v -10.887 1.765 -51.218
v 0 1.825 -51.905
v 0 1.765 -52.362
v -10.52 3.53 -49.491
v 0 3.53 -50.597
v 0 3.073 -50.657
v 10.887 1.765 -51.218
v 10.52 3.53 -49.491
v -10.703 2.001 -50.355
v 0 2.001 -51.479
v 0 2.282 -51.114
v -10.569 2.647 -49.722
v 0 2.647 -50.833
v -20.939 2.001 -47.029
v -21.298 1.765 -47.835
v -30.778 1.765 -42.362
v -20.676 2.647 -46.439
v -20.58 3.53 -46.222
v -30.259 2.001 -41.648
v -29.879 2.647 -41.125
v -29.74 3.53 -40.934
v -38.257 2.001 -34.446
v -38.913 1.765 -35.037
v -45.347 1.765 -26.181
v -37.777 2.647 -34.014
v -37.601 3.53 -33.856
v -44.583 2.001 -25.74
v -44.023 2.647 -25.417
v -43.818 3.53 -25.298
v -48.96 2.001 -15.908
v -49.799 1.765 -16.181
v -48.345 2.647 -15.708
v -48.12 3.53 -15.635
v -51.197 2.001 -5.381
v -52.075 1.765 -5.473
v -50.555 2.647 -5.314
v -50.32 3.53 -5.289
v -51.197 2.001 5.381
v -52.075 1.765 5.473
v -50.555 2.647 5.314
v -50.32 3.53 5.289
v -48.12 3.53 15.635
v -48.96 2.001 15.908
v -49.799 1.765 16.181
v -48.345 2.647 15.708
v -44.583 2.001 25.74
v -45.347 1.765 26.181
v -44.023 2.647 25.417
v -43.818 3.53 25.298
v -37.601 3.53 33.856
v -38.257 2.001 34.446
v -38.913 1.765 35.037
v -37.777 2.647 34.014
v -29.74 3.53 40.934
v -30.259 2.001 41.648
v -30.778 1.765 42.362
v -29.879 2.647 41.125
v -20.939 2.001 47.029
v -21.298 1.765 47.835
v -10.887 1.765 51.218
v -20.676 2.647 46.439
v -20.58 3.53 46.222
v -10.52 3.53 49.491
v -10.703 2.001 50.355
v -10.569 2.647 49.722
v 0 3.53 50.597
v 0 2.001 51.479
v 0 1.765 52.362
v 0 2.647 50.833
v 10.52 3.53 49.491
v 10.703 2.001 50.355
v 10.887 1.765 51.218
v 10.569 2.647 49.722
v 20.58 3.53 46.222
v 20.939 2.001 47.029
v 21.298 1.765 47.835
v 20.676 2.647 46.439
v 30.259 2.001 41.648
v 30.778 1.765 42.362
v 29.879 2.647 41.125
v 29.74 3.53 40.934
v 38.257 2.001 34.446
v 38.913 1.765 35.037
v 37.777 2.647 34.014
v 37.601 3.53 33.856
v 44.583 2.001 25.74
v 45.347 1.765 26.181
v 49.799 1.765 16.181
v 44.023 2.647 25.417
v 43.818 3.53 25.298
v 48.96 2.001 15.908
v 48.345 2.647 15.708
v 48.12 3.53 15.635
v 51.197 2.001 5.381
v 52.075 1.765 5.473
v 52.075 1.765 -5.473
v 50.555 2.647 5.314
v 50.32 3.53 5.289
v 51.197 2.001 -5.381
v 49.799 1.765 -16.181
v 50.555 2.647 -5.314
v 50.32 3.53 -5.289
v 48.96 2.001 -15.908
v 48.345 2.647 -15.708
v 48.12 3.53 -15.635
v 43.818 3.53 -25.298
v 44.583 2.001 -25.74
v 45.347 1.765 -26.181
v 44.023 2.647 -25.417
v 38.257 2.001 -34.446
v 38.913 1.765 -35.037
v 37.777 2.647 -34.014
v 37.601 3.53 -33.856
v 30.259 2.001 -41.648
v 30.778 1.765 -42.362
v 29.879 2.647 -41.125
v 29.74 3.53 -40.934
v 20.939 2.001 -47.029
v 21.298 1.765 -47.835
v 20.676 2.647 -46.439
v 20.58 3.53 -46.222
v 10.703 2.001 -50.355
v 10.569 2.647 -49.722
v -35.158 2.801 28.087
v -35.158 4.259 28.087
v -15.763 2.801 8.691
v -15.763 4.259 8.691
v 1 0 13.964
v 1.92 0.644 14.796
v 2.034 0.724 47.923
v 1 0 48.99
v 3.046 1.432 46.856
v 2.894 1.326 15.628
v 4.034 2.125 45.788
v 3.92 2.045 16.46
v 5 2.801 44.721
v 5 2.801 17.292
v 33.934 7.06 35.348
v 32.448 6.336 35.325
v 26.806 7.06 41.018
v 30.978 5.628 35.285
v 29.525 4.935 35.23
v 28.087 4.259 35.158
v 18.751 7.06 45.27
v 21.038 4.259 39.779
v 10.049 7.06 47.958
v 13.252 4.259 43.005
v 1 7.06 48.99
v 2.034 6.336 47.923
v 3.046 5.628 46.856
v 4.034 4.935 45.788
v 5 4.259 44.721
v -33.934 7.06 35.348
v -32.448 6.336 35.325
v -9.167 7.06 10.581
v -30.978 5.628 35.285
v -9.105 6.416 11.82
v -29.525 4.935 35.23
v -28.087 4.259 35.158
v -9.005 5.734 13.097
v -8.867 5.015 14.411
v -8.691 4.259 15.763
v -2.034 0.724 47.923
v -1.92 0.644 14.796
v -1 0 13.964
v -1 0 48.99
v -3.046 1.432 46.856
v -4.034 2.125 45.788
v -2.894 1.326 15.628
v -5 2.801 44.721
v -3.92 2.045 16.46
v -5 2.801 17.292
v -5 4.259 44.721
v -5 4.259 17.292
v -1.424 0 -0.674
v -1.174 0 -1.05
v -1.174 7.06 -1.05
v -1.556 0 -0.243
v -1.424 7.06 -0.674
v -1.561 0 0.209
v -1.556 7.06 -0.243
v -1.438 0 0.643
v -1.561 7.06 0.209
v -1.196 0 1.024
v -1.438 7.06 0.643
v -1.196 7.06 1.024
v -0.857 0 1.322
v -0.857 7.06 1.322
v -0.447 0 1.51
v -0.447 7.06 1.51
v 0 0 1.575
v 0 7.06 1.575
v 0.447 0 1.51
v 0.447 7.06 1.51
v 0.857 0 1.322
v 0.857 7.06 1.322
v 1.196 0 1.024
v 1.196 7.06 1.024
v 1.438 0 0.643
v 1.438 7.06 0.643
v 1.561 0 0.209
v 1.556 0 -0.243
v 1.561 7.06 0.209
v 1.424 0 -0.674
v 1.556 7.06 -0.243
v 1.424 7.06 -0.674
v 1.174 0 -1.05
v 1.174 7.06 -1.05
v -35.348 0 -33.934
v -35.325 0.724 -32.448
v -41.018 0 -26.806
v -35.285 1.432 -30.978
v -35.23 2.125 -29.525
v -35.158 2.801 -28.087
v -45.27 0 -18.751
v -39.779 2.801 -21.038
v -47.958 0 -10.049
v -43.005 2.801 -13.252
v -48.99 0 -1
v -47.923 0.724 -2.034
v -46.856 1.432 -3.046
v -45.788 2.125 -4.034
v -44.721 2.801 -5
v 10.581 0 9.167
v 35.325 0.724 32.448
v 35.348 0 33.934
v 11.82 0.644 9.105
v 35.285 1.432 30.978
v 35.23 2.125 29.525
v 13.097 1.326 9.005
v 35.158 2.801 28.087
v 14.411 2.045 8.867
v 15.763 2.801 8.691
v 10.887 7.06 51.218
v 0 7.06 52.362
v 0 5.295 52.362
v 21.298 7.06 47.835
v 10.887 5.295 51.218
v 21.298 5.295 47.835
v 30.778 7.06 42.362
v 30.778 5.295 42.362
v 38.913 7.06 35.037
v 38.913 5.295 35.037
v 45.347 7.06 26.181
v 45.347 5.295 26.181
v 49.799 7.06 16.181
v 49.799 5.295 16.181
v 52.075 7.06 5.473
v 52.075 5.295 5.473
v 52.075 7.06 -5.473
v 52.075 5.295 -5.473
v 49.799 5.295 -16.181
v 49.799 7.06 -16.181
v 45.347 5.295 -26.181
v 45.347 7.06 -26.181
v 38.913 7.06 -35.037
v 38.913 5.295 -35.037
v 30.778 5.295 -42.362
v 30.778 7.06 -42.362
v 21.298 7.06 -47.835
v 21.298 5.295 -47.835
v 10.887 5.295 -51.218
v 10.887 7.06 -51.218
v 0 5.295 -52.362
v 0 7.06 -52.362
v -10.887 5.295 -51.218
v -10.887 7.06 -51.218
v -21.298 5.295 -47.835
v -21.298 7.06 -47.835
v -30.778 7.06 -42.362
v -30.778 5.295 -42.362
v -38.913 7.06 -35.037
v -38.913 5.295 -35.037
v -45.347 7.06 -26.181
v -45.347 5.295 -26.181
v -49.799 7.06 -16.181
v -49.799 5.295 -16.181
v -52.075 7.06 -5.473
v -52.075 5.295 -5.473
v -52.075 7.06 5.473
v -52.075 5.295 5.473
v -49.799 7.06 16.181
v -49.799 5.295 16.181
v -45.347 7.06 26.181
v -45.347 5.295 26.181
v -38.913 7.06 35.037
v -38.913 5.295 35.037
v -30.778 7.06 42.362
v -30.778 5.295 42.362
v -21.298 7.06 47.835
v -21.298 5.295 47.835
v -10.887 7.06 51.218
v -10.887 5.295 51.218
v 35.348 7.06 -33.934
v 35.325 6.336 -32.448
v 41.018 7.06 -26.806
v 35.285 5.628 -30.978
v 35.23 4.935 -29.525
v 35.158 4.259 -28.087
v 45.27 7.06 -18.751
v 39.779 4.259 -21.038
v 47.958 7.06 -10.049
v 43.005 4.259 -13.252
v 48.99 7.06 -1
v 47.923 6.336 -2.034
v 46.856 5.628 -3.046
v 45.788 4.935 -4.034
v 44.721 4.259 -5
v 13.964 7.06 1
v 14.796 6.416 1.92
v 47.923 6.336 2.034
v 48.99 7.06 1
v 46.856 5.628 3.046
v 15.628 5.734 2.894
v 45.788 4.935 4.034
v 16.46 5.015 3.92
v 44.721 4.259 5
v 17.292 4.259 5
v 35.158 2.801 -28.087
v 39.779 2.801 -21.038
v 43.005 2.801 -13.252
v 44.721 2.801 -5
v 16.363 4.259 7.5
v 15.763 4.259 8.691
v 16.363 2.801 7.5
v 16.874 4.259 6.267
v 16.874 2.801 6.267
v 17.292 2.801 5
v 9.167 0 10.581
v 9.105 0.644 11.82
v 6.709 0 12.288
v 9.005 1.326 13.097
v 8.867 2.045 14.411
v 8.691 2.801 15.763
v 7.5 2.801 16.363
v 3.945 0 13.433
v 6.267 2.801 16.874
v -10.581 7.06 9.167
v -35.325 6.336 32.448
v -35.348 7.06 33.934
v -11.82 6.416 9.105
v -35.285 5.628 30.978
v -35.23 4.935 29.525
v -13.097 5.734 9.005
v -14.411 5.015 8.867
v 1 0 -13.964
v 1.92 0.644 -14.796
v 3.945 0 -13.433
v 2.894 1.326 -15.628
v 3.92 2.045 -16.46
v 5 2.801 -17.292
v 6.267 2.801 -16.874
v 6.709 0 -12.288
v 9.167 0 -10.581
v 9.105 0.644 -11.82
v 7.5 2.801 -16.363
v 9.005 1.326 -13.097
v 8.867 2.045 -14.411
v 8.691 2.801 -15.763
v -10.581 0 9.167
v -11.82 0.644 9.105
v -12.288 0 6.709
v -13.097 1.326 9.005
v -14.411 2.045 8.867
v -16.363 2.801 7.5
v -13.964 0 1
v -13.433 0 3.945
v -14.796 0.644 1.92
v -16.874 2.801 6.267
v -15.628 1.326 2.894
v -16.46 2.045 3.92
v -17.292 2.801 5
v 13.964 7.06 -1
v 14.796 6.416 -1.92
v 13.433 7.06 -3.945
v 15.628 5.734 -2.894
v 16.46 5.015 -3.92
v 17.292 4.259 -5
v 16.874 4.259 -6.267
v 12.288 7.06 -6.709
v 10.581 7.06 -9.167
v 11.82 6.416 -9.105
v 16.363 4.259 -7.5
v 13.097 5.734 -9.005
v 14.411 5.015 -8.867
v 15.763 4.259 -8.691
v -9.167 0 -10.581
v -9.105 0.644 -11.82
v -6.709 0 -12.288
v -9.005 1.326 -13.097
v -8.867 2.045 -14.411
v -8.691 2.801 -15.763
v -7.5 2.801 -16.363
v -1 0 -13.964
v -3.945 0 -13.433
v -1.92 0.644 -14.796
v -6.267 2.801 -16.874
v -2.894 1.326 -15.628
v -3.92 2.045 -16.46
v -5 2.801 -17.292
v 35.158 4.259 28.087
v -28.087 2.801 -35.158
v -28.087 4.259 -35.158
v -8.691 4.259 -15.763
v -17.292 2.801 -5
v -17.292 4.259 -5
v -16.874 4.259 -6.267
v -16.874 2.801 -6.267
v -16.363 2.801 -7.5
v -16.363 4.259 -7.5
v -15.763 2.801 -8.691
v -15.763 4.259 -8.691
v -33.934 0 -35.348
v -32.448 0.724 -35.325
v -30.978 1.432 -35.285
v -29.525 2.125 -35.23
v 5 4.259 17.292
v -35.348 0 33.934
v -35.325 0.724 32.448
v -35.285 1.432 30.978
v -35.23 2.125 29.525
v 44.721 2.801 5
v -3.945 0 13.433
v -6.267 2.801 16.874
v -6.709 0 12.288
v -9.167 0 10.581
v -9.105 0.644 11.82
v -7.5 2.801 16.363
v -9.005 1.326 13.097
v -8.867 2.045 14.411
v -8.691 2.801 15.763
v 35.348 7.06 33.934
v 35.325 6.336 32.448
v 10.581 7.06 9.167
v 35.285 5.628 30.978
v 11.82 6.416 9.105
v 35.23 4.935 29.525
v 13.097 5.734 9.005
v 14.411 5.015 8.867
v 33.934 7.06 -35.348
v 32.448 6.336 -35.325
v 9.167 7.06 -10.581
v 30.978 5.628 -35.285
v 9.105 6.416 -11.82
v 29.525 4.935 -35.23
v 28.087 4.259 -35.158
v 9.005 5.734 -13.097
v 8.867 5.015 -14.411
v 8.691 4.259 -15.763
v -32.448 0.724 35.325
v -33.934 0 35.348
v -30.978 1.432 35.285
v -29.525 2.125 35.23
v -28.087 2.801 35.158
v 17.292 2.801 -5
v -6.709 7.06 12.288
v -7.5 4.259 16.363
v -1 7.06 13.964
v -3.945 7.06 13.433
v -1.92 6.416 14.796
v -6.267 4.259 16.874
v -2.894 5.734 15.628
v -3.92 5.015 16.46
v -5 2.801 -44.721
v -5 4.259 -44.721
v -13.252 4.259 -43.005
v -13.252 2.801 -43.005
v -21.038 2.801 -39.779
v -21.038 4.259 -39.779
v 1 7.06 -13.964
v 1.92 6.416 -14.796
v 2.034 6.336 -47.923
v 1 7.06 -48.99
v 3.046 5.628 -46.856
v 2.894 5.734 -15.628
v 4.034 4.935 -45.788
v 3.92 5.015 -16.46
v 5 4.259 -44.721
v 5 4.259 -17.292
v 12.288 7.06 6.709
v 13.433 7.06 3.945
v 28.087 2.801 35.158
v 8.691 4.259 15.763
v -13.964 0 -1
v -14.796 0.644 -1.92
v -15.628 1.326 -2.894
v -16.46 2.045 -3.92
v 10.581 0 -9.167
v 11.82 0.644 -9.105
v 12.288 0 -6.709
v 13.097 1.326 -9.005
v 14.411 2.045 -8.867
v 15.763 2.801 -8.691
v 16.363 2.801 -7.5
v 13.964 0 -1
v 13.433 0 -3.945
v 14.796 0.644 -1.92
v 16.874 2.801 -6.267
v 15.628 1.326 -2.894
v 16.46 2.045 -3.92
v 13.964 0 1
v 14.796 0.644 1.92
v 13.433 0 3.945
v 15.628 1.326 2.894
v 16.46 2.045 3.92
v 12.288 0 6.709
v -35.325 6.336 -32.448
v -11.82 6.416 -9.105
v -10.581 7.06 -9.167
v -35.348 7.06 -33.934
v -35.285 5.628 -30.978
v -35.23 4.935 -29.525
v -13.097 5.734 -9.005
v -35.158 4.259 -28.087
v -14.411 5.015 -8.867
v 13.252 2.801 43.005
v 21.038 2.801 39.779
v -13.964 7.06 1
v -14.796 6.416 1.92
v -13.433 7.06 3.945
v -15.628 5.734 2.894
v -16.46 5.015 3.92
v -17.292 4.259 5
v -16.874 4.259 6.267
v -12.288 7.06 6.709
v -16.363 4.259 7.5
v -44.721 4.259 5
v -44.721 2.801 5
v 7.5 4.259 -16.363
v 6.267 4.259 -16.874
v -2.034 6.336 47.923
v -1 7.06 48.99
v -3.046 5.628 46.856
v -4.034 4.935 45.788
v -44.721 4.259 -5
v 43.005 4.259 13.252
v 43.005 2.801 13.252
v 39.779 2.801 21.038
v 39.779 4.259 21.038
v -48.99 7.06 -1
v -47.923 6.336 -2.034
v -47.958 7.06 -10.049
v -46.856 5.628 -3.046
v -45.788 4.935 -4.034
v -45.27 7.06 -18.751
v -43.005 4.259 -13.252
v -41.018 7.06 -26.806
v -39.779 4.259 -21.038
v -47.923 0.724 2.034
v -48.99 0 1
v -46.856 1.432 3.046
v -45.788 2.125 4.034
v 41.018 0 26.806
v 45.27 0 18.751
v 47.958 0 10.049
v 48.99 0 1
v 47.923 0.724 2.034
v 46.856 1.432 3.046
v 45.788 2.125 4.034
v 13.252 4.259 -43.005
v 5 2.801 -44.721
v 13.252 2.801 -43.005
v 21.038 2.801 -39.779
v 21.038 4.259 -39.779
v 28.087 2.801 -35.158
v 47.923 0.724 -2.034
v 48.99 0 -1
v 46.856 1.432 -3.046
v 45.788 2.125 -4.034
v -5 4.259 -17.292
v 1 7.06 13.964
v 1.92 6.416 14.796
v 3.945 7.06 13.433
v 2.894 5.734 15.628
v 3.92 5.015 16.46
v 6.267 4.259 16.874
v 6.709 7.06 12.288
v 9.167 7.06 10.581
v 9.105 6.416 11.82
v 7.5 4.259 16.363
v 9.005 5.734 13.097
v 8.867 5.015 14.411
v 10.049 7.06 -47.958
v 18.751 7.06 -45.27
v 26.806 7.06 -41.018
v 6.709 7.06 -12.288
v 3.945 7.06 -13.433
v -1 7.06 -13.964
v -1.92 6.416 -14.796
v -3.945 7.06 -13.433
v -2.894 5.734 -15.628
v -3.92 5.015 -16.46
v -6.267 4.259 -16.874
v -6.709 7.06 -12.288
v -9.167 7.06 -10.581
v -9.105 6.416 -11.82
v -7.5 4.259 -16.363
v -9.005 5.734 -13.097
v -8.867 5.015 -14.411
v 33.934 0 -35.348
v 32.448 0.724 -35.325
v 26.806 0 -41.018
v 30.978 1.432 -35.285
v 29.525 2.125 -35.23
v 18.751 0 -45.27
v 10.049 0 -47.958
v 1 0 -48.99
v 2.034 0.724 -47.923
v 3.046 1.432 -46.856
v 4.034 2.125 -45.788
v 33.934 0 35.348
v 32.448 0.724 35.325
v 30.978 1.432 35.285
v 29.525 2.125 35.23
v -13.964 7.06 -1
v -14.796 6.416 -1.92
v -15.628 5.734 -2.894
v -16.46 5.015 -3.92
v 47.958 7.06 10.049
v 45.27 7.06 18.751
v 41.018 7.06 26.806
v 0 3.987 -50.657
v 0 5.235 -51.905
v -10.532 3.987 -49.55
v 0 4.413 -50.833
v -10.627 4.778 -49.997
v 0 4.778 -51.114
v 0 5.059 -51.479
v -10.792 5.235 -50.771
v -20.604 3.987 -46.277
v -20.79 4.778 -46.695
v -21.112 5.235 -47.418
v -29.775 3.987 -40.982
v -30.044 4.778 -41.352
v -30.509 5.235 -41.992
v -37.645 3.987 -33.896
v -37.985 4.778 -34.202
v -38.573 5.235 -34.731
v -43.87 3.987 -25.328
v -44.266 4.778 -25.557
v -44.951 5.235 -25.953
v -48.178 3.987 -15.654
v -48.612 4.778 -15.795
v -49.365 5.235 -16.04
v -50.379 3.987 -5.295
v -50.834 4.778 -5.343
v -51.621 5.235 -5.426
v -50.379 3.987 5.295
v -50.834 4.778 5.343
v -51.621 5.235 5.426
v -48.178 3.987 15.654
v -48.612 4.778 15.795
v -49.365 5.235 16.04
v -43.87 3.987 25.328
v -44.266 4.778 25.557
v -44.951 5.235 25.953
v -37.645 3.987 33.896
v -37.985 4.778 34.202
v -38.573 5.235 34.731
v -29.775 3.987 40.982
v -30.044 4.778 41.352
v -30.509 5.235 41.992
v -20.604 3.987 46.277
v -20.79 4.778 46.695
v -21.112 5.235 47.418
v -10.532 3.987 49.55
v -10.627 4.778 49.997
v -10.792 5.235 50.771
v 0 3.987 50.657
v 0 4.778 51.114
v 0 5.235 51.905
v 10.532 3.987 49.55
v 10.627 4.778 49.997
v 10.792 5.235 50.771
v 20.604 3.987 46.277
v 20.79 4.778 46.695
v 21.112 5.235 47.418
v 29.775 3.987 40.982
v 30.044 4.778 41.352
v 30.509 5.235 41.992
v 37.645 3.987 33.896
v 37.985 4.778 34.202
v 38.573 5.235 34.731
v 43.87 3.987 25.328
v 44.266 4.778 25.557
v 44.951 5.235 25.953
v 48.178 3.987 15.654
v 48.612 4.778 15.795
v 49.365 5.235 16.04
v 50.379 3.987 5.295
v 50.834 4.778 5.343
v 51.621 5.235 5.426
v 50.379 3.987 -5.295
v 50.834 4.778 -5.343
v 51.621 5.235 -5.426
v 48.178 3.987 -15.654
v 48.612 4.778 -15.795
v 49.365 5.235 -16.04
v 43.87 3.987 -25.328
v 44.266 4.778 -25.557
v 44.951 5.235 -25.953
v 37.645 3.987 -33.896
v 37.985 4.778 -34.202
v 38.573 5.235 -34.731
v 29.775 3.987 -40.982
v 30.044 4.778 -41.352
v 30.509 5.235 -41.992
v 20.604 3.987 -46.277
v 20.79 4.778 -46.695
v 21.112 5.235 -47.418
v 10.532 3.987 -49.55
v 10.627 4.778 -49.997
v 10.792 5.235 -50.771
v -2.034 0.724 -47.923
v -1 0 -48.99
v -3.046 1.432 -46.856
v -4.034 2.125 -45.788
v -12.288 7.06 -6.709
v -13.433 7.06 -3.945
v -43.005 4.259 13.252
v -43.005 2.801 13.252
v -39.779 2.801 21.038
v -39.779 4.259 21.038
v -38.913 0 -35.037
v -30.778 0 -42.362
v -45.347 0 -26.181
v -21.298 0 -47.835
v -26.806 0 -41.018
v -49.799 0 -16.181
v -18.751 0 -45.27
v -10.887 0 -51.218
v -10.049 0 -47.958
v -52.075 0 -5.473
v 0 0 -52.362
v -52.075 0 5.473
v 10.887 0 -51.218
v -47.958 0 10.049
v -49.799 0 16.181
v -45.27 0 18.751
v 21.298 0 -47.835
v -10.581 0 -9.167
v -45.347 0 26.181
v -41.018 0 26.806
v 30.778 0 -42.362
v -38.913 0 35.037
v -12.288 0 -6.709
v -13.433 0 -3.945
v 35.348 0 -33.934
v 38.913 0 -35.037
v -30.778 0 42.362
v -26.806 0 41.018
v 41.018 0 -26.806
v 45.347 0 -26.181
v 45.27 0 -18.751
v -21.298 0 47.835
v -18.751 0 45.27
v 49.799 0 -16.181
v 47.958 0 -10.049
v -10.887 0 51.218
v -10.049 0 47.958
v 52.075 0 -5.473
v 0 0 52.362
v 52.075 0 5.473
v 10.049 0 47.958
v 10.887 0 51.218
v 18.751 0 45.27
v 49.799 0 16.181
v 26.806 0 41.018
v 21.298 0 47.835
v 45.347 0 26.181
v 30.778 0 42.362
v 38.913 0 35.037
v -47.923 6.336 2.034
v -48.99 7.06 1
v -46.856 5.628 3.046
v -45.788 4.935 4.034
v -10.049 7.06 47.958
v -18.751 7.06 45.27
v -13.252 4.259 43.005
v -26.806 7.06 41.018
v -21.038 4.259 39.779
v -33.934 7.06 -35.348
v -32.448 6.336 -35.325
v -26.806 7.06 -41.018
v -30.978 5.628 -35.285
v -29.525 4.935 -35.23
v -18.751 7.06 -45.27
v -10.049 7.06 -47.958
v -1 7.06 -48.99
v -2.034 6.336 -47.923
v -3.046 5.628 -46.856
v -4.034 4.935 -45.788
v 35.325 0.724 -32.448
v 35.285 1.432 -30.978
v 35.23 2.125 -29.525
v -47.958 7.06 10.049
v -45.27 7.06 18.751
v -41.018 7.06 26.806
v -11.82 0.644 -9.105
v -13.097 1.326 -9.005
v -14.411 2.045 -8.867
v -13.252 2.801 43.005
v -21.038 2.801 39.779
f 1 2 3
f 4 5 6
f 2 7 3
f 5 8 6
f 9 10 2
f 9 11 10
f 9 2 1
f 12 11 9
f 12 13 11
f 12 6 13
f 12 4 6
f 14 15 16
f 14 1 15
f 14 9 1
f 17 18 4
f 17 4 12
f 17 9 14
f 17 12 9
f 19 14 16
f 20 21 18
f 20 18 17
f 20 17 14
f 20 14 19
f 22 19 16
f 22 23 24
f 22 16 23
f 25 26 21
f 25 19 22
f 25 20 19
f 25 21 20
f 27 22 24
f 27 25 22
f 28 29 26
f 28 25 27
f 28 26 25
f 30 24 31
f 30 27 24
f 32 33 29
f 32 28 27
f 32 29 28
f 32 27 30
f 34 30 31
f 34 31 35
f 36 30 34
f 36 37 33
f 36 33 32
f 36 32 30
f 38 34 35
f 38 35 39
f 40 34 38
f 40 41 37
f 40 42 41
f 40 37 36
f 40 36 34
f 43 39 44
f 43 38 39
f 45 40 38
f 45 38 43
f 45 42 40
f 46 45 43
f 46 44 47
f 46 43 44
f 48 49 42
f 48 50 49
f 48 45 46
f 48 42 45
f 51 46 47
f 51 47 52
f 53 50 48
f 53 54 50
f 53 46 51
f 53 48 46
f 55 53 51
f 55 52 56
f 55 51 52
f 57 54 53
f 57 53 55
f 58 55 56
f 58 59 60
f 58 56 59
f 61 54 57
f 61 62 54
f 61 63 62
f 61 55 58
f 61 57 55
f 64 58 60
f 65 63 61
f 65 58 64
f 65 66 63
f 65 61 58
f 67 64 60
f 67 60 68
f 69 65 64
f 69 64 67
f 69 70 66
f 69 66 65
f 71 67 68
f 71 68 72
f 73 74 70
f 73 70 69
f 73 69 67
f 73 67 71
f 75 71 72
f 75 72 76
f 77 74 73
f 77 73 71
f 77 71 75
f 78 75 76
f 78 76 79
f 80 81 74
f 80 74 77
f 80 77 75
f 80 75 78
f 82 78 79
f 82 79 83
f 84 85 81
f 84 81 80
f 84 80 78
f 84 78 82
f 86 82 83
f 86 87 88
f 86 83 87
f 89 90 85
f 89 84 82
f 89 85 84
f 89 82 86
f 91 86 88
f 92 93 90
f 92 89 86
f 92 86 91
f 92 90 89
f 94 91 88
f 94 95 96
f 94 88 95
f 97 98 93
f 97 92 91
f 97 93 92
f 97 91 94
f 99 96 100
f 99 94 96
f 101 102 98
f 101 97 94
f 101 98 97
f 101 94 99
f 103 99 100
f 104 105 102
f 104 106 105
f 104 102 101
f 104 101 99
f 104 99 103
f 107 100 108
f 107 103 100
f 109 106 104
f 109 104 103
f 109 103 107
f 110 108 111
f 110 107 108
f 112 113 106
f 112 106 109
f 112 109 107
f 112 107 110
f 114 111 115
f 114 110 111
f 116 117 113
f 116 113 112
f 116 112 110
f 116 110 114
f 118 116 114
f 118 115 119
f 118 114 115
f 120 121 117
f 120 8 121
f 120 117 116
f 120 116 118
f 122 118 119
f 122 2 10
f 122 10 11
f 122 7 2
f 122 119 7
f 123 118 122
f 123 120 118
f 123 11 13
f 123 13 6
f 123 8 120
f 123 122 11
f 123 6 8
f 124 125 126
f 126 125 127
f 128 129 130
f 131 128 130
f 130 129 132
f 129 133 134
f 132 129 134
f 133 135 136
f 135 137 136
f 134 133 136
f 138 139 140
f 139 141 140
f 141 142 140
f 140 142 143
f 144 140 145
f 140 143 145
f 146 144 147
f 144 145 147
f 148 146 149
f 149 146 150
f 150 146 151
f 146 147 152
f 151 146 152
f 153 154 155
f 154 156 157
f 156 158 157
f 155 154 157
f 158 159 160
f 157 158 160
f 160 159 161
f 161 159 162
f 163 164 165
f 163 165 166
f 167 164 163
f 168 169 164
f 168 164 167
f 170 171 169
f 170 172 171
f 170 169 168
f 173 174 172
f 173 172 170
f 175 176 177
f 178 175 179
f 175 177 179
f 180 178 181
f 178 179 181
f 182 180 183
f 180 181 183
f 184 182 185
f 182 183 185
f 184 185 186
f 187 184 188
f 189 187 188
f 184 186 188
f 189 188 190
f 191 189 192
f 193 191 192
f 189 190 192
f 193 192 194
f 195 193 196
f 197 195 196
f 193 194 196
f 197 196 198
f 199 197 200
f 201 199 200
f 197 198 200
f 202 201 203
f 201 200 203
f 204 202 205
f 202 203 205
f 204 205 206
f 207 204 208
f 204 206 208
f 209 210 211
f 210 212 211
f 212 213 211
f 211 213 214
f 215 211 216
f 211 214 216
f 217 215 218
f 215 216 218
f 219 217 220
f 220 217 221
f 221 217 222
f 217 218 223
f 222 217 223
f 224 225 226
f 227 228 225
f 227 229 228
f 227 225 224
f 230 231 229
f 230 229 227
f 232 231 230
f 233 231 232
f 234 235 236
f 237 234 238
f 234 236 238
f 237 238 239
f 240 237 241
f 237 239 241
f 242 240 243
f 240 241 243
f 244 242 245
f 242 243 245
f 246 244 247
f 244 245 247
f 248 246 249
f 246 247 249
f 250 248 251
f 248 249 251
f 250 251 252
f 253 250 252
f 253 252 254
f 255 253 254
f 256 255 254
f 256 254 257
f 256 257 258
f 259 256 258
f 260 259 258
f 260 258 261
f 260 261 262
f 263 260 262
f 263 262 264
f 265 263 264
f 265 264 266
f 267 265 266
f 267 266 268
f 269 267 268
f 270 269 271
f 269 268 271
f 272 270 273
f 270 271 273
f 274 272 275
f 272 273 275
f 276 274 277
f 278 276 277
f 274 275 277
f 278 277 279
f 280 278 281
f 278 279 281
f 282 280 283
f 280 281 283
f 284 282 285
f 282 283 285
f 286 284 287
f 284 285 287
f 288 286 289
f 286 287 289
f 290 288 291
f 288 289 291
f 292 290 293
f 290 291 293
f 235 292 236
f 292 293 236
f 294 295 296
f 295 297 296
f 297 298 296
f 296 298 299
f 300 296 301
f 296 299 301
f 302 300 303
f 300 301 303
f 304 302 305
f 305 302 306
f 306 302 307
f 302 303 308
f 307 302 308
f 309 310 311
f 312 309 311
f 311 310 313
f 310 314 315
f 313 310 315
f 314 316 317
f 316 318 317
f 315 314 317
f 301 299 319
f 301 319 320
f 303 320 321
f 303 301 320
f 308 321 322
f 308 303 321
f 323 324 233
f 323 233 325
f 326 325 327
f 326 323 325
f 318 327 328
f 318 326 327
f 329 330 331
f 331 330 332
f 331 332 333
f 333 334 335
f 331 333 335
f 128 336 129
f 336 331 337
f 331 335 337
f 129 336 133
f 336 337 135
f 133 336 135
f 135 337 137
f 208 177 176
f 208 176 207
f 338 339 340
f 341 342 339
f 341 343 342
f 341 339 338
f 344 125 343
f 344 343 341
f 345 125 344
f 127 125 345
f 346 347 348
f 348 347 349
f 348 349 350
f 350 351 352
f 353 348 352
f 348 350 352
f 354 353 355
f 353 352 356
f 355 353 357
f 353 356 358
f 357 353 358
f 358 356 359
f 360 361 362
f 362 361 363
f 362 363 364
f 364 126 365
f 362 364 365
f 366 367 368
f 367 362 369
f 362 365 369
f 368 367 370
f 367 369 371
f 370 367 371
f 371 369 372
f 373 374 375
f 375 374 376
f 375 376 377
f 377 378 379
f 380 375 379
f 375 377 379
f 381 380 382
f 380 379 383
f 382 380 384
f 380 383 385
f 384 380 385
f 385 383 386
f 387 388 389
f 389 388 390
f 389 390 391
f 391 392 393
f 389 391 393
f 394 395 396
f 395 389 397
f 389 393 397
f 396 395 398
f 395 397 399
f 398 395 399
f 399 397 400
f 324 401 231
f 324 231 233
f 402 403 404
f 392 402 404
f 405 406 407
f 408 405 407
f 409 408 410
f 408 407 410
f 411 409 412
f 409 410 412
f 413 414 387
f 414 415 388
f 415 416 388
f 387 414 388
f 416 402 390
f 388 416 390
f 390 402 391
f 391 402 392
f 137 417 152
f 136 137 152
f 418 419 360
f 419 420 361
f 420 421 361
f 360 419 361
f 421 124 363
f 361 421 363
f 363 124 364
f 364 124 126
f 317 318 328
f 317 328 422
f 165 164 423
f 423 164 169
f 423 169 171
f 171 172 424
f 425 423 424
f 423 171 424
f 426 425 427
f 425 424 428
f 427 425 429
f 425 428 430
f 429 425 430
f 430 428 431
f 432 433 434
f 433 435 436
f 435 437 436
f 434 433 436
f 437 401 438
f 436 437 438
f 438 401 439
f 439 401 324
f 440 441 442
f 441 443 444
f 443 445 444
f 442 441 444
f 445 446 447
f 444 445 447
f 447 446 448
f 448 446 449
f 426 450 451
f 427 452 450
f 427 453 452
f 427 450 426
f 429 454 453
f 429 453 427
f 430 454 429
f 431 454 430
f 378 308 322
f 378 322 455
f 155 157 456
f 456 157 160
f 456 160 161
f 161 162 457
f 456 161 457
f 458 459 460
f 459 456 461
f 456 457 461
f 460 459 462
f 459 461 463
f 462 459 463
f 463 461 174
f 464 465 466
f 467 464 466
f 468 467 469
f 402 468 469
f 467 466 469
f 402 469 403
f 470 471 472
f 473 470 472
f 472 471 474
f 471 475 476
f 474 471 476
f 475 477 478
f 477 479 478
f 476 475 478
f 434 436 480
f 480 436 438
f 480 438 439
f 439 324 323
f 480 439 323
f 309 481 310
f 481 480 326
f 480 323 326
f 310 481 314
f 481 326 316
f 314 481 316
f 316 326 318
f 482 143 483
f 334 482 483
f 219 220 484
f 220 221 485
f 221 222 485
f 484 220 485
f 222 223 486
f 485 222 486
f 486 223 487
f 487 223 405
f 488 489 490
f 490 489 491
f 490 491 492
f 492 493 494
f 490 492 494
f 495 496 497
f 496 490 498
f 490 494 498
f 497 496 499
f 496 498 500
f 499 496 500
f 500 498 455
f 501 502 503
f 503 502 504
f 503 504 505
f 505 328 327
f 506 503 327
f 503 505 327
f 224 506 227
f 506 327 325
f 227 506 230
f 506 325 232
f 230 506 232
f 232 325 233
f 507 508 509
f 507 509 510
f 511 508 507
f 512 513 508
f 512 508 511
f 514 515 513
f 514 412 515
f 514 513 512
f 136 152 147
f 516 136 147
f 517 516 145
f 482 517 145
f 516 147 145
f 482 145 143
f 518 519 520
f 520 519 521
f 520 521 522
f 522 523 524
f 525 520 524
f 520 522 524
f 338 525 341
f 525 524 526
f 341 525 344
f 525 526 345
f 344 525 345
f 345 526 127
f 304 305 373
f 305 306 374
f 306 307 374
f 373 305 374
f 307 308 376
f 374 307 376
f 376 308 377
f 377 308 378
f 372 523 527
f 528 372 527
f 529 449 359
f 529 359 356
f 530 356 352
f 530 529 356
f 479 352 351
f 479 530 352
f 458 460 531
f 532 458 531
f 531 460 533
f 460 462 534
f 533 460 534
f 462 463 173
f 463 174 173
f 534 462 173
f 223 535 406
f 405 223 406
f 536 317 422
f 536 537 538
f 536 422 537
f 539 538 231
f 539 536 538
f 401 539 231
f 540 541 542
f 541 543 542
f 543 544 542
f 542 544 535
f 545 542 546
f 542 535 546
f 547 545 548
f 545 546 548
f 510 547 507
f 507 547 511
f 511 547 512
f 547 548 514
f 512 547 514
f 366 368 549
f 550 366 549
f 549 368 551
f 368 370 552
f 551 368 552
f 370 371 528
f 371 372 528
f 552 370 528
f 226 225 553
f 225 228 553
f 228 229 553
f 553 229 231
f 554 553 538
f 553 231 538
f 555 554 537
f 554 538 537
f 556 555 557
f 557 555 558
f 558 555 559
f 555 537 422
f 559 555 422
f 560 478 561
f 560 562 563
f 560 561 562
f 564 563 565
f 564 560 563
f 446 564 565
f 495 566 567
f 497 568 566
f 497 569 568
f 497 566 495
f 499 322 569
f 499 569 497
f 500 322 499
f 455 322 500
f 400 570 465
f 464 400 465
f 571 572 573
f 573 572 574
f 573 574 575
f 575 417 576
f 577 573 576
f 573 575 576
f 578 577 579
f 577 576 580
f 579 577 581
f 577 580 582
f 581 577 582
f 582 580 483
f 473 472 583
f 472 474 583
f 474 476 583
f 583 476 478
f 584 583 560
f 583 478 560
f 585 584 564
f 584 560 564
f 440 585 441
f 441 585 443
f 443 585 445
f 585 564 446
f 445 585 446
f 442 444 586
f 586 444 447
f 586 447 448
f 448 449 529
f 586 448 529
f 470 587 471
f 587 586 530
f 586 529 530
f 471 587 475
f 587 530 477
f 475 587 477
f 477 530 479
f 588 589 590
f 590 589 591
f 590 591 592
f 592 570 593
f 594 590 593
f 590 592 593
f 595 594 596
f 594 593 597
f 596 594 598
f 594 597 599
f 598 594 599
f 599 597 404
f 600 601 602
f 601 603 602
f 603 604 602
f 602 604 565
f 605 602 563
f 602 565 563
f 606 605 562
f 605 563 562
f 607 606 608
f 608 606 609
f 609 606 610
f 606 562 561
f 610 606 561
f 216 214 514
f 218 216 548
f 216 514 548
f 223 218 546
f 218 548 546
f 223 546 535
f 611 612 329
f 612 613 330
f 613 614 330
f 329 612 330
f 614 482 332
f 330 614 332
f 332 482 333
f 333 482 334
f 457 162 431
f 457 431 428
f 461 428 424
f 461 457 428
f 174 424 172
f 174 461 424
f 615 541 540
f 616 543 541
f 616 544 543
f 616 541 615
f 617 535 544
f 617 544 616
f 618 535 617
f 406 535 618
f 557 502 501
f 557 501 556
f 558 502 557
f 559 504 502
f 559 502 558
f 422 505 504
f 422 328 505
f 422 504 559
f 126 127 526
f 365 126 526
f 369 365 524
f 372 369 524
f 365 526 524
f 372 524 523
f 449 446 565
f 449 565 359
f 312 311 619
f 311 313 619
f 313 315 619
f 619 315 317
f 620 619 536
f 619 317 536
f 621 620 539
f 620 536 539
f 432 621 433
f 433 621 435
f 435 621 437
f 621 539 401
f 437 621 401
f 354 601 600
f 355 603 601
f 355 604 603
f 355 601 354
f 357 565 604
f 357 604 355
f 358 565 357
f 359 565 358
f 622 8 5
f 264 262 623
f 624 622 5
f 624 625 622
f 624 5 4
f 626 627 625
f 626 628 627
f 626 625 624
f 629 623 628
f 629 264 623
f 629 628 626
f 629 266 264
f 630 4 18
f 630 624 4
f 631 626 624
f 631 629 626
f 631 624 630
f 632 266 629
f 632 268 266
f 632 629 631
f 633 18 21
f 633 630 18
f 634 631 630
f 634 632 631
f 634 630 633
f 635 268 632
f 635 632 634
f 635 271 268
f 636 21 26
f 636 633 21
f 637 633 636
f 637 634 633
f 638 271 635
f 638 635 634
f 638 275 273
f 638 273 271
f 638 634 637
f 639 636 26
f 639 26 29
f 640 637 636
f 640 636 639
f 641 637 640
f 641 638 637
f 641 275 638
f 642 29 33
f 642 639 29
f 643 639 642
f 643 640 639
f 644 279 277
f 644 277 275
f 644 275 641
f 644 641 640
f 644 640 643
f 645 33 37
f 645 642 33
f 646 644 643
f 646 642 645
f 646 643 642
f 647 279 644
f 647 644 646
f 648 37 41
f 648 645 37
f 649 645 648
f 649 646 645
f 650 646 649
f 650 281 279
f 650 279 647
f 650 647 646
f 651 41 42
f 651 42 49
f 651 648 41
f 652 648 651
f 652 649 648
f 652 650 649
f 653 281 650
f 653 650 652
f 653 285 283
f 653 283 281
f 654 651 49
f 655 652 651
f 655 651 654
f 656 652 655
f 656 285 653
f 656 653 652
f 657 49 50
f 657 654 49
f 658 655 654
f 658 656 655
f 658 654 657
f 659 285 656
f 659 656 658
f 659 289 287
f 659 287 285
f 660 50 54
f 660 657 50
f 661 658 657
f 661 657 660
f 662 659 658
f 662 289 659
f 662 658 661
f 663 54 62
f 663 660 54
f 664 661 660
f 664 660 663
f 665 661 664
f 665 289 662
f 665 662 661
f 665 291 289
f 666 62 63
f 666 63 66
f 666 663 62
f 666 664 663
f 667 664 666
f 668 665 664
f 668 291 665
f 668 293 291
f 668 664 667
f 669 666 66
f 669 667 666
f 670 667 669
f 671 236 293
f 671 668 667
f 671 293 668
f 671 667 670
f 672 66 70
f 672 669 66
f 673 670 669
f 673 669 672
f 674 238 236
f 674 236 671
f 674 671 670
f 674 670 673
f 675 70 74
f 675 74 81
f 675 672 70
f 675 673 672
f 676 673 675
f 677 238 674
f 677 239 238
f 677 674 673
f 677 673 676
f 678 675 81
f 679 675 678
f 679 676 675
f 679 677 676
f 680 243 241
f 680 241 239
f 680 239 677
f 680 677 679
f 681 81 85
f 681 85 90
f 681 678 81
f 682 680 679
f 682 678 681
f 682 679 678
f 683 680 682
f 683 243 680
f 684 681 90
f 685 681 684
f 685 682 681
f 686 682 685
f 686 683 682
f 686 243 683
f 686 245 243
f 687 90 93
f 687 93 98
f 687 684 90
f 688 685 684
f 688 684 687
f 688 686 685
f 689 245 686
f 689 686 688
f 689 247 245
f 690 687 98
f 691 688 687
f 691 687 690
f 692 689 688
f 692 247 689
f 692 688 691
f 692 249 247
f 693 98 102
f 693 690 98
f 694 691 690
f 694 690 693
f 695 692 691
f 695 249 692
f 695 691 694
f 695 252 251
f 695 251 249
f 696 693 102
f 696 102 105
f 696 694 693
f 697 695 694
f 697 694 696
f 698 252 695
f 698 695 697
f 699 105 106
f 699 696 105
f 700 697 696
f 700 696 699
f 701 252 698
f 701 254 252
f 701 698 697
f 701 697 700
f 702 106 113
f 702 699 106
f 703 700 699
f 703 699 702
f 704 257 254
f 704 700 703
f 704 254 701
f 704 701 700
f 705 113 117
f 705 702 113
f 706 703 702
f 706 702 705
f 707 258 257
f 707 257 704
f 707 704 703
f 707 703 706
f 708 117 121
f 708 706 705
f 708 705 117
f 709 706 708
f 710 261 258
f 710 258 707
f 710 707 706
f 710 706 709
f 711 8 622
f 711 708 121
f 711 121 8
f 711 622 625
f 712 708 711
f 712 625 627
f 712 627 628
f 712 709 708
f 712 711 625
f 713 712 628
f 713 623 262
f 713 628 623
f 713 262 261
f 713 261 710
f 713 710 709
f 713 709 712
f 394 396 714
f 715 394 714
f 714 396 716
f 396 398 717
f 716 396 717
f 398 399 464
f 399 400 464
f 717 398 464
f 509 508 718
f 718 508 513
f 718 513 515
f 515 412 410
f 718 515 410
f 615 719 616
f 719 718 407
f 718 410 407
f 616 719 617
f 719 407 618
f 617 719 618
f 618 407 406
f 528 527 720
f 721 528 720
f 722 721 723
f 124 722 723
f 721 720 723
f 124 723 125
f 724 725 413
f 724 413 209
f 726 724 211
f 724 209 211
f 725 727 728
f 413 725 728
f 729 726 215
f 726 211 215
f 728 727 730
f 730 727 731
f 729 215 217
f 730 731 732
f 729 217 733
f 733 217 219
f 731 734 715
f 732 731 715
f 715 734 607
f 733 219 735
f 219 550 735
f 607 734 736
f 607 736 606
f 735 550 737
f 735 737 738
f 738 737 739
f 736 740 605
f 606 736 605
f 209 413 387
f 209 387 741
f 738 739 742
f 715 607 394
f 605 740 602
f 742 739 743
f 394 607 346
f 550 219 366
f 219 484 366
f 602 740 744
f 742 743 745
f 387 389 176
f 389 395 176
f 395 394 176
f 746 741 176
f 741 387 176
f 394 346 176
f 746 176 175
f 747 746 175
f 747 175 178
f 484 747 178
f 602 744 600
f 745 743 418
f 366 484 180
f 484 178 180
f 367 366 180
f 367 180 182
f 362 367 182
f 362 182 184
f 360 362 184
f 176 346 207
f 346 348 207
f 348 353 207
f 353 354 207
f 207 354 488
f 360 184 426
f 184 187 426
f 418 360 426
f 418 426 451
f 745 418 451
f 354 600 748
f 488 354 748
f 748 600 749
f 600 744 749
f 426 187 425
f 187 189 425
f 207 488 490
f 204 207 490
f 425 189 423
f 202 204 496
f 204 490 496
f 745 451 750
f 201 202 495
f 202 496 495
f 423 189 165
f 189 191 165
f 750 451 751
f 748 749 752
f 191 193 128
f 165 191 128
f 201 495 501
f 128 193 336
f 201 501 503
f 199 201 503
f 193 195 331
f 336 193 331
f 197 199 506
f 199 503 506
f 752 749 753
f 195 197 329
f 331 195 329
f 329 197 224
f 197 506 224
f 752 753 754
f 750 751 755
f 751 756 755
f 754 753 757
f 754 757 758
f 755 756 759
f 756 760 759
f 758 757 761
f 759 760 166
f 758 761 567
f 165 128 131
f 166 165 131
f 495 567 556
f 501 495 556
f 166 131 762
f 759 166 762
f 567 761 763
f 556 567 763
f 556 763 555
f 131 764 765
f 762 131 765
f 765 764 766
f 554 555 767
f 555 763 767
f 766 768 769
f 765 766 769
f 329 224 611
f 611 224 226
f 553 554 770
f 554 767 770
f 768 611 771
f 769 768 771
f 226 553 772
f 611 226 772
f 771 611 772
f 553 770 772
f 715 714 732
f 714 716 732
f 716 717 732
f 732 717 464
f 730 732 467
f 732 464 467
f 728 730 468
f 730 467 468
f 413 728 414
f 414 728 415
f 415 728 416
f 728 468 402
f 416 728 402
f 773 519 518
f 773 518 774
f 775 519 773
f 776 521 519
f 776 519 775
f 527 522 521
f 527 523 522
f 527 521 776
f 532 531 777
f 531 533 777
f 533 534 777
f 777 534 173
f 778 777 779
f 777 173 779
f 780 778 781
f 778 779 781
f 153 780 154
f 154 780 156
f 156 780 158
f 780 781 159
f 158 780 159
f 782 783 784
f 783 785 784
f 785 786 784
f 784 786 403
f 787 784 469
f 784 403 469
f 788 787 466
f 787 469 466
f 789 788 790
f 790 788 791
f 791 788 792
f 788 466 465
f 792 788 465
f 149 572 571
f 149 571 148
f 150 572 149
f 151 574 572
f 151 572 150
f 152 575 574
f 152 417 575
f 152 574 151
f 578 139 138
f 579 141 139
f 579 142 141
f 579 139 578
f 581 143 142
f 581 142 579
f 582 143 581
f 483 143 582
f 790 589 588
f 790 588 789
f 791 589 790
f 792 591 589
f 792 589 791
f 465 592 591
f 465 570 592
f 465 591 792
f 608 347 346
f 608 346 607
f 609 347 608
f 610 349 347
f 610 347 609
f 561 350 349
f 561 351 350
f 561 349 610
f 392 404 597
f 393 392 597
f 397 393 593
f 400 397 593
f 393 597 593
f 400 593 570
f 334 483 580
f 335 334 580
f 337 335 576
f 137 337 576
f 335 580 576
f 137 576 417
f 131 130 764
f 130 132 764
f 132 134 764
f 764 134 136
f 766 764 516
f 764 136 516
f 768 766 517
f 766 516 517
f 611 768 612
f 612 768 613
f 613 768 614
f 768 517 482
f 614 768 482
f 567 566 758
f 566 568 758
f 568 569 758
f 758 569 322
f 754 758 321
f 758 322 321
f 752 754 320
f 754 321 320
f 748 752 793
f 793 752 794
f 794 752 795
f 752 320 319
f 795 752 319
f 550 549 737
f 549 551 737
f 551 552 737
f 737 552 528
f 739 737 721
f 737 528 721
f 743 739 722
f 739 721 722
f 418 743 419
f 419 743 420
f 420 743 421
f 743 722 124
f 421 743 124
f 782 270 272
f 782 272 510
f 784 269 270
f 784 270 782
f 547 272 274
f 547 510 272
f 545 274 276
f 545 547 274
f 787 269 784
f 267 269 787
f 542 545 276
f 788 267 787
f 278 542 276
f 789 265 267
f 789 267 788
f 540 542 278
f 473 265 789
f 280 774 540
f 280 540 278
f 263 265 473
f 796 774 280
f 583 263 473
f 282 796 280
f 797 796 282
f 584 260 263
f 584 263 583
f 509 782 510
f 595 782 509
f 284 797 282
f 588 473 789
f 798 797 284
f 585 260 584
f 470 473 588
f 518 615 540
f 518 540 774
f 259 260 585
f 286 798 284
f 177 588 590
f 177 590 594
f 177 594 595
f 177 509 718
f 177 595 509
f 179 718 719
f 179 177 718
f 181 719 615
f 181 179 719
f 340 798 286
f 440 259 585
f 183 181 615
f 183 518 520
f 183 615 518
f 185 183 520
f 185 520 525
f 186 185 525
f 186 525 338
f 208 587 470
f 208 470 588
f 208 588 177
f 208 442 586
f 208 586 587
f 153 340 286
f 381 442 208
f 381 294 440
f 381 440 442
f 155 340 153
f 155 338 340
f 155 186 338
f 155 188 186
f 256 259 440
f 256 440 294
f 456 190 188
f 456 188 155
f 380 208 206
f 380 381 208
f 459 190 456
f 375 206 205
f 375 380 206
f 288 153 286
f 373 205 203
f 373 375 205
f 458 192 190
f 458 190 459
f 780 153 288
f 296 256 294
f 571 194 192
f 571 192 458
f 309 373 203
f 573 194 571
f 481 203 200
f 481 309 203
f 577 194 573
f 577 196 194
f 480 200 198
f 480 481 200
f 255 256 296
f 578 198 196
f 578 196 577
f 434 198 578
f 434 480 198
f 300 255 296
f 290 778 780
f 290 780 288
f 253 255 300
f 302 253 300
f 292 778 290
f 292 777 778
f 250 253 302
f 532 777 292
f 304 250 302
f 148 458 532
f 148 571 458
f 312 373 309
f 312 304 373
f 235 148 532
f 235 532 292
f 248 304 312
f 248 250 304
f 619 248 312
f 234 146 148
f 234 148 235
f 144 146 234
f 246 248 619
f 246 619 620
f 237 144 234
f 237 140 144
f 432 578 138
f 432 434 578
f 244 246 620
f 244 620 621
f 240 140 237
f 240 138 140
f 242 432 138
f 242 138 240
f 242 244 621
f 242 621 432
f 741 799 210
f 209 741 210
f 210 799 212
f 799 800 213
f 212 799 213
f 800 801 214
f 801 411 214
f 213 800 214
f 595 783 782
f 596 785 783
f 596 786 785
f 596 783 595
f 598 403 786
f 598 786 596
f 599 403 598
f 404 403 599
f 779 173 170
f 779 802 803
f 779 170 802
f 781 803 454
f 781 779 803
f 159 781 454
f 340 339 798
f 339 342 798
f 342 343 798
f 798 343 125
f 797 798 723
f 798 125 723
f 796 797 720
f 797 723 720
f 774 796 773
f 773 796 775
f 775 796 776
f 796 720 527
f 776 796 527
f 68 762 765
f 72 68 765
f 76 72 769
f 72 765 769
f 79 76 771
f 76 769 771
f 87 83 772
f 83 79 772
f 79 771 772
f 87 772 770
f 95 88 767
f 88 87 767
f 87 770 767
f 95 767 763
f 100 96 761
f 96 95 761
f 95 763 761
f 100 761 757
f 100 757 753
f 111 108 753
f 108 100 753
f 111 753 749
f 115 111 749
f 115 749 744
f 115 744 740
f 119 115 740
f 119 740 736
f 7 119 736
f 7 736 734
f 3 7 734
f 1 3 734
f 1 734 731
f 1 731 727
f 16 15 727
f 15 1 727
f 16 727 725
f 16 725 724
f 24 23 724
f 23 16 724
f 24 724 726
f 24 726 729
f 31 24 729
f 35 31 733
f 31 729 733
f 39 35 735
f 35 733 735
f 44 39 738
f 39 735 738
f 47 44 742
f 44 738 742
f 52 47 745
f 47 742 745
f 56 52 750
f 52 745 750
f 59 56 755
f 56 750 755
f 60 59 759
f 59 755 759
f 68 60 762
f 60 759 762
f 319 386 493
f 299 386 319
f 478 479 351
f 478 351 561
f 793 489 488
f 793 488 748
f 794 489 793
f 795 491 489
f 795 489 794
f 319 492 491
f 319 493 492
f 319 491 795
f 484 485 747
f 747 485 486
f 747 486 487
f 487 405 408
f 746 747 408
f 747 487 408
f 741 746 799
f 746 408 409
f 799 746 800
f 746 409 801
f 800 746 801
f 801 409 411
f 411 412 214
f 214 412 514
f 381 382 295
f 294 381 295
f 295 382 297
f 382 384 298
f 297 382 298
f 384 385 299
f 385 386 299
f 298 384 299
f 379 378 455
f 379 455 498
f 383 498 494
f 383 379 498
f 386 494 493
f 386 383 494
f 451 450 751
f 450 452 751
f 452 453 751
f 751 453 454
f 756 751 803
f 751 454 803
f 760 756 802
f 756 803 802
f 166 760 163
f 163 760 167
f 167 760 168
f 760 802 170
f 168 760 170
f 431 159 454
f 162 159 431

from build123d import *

# Parameters (mm, degrees)
SKETCH1_R           = 52.3621
BOSS_EXTRUDE1_DEPTH = 7.06
SKETCH4_R           = 1.7653
SKETCH6_R           = 1.575
CUT_EXTRUDE1_DEPTH  = 7.06
BOSS_EXTRUDE2_DEPTH = 7.06
CUT_EXTRUDE3_DEPTH  = 7.06
CHAMFER17_SIZE      = 4
CHAMFER17_SIZE2     = 2.800830153
CHAMFER18_SIZE      = 4
CHAMFER18_SIZE2     = 2.800830153
CHAMFER19_SIZE      = 4
CHAMFER19_SIZE2     = 2.800830153
CHAMFER20_SIZE      = 4
CHAMFER20_SIZE2     = 2.800830153
CHAMFER21_SIZE      = 4
CHAMFER21_SIZE2     = 2.800830153
CHAMFER25_SIZE      = 4
CHAMFER25_SIZE2     = 2.800830153
CHAMFER26_SIZE      = 4
CHAMFER26_SIZE2     = 2.800830153
CHAMFER39_SIZE      = 4
CHAMFER39_SIZE2     = 2.800830153
CHAMFER40_SIZE      = 4
CHAMFER40_SIZE2     = 2.800830153
CHAMFER42_SIZE      = 4
CHAMFER42_SIZE2     = 2.800830153
CHAMFER43_SIZE      = 4
CHAMFER43_SIZE2     = 2.800830153
CHAMFER44_SIZE      = 4
CHAMFER44_SIZE2     = 2.800830153
CHAMFER45_SIZE      = 4
CHAMFER45_SIZE2     = 2.800830153
CHAMFER46_SIZE      = 4
CHAMFER46_SIZE2     = 2.800830153


with BuildPart() as part:
    # Sketch1 → Boss-Extrude1 (new body)
    with BuildSketch(Plane(origin=(0, 0, 0), x_dir=(1, 0, 0), z_dir=(0, 1, 0))):
        with Locations(Location((0, 0, 0), (0, 0, 270))):
            Circle(SKETCH1_R)
    extrude(amount=BOSS_EXTRUDE1_DEPTH)

    # Sketch4 → Cut-Revolve2 (revolve, cut)
    with BuildSketch(Plane(origin=(0, 0, 0), x_dir=(0, 0, -1), z_dir=(1, 0, 0)), mode=Mode.PRIVATE) as cut_revolve2_sk:
        with Locations((-52.3621, 3.53)):
            Circle(SKETCH4_R)
    revolve(cut_revolve2_sk.sketch.rotate(Axis((0, 3.53, 0), (0, 1, 0)), 180), axis=Axis((0, 3.53, 0), (0, 1, 0)), mode=Mode.SUBTRACT)

    # Sketch6 → Cut-Extrude1 (cut)
    with BuildSketch(Plane(origin=(0, 7.06, 0), x_dir=(1, 0, 0), z_dir=(0, 1, 0))):
        with Locations(Location((0, 0, 0), (0, 0, 270))):
            Circle(SKETCH6_R)
    extrude(amount=-CUT_EXTRUDE1_DEPTH, mode=Mode.SUBTRACT)

    # Sketch7 → Boss-Extrude2 (add)
    with BuildSketch(Plane(origin=(0, 7.06, 0), x_dir=(1, 0, 0), z_dir=(0, 1, 0))):
        with BuildLine():
            Line((-1.173935688, 1.05), (1.173935688, 1.05))
            ThreePointArc((1.173935688, 1.05), (0, 1.575), (-1.173935688, 1.05))
        make_face()
    extrude(amount=-BOSS_EXTRUDE2_DEPTH)

    # Sketch8 → Cut-Extrude3 (cut)
    with BuildSketch(Plane(origin=(0, 7.06, 0), x_dir=(1, 0, 0), z_dir=(0, 1, 0))):
        with BuildLine():
            Line((-44.72135955, 5), (-17.291616466, 5))
            ThreePointArc((-17.291616466, 5), (-16.629831585, 6.888301783), (-15.762553167, 8.691485355))
            Line((-15.762553167, 8.691485355), (-35.158310508, 28.087242696))
            ThreePointArc((-35.158310508, 28.087242696), (-41.574578963, 17.220754456), (-44.72135955, 5))
        make_face()
        with BuildLine():
            Line((-17.291616466, -5), (-44.72135955, -5))
            ThreePointArc((-44.72135955, -5), (-41.574578963, -17.220754456), (-35.158310508, -28.087242696))
            Line((-35.158310508, -28.087242696), (-15.762553167, -8.691485355))
            ThreePointArc((-15.762553167, -8.691485355), (-16.629831585, -6.888301783), (-17.291616466, -5))
        make_face()
        with BuildLine():
            Line((17.291616466, -5), (44.72135955, -5))
            ThreePointArc((44.72135955, -5), (41.574578963, -17.220754456), (35.158310508, -28.087242696))
            Line((35.158310508, -28.087242696), (15.762553167, -8.691485355))
            ThreePointArc((15.762553167, -8.691485355), (16.629831585, -6.888301783), (17.291616466, -5))
        make_face()
        with BuildLine():
            Line((15.762553167, 8.691485355), (35.158310508, 28.087242696))
            ThreePointArc((35.158310508, 28.087242696), (41.574578963, 17.220754456), (44.72135955, 5))
            Line((44.72135955, 5), (17.291616466, 5))
            ThreePointArc((17.291616466, 5), (16.629831585, 6.888301783), (15.762553167, 8.691485355))
        make_face()
        with BuildLine():
            Line((-28.087242696, 35.158310508), (-8.691485355, 15.762553167))
            ThreePointArc((-8.691485355, 15.762553167), (-6.888301783, 16.629831585), (-5, 17.291616466))
            Line((-5, 17.291616466), (-5, 44.72135955))
            ThreePointArc((-5, 44.72135955), (-17.220754456, 41.574578963), (-28.087242696, 35.158310508))
        make_face()
        with BuildLine():
            Line((5, 17.291616466), (5, 44.72135955))
            ThreePointArc((5, 44.72135955), (17.220754456, 41.574578963), (28.087242696, 35.158310508))
            Line((28.087242696, 35.158310508), (8.691485355, 15.762553167))
            ThreePointArc((8.691485355, 15.762553167), (6.888301783, 16.629831585), (5, 17.291616466))
        make_face()
        with BuildLine():
            Line((-28.087242696, -35.158310508), (-8.691485355, -15.762553167))
            ThreePointArc((-8.691485355, -15.762553167), (-6.888301783, -16.629831585), (-5, -17.291616466))
            Line((-5, -17.291616466), (-5, -44.72135955))
            ThreePointArc((-5, -44.72135955), (-17.220754456, -41.574578963), (-28.087242696, -35.158310508))
        make_face()
        with BuildLine():
            Line((5, -17.291616466), (5, -44.72135955))
            ThreePointArc((5, -44.72135955), (17.220754456, -41.574578963), (28.087242696, -35.158310508))
            Line((28.087242696, -35.158310508), (8.691485355, -15.762553167))
            ThreePointArc((8.691485355, -15.762553167), (6.888301783, -16.629831585), (5, -17.291616466))
        make_face()
    extrude(amount=-CUT_EXTRUDE3_DEPTH, mode=Mode.SUBTRACT)

    # Chamfer17
    chamfer17_edges = [part.edges().sort_by_distance(p)[0] for p in [
        (-18.389364025, 7.06, -25.460431837),
        (-25.460431837, 7.06, -18.389364025),
    ]]
    chamfer17_side = [part.faces().sort_by_distance(p)[0] for p in [
        (0, 7.06, -50.881076161),
    ]]
    chamfer(chamfer17_edges, length=CHAMFER17_SIZE, length2=CHAMFER17_SIZE2, reference=chamfer17_side[0])

    # Chamfer18
    chamfer18_edges = [part.edges().sort_by_distance(p)[0] for p in [
        (-18.389364025, 0, -25.460431837),
    ]]
    chamfer18_side = [part.faces().sort_by_distance(p)[0] for p in [
        (0, 0, -50.881076161),
    ]]
    chamfer(chamfer18_edges, length=CHAMFER18_SIZE, length2=CHAMFER18_SIZE2, reference=chamfer18_side[0])

    # Chamfer19
    chamfer19_edges = [part.edges().sort_by_distance(p)[0] for p in [
        (-25.460431837, 0, -18.389364025),
    ]]
    chamfer19_side = [part.faces().sort_by_distance(p)[0] for p in [
        (-19.682698274, 0, -42.107920464),
    ]]
    chamfer(chamfer19_edges, length=CHAMFER19_SIZE, length2=CHAMFER19_SIZE2, reference=chamfer19_side[0])

    # Chamfer20
    chamfer20_edges = [part.edges().sort_by_distance(p)[0] for p in [
        (-31.006488008, 7.06, -5),
        (-31.006488008, 7.06, 5),
    ]]
    chamfer20_side = [part.faces().sort_by_distance(p)[0] for p in [
        (-19.682698274, 7.06, -42.107920464),
    ]]
    chamfer(chamfer20_edges, length=CHAMFER20_SIZE, length2=CHAMFER20_SIZE2, reference=chamfer20_side[0])

    # Chamfer21
    chamfer21_edges = [part.edges().sort_by_distance(p)[0] for p in [
        (18.389364025, 7.06, -25.460431837),
        (5, 7.06, -31.006488008),
        (-5, 7.06, -31.006488008),
        (-25.460431837, 7.06, 18.389364025),
        (31.006488008, 7.06, -5),
        (25.460431837, 7.06, -18.389364025),
        (25.460431837, 7.06, 18.389364025),
        (31.006488008, 7.06, 5),
        (-18.389364025, 7.06, 25.460431837),
        (-5, 7.06, 31.006488008),
        (5, 7.06, 31.006488008),
        (18.389364025, 7.06, 25.460431837),
    ]]
    chamfer21_side = [part.faces().sort_by_distance(p)[0] for p in [
        (2.323352496, 7.06, 0.962148374),
    ]]
    chamfer(chamfer21_edges, length=CHAMFER21_SIZE, length2=CHAMFER21_SIZE2, reference=chamfer21_side[0])

    # Chamfer25
    chamfer25_edges = [part.edges().sort_by_distance(p)[0] for p in [
        (5, 0, -31.006488008),
        (-5, 0, -31.006488008),
    ]]
    chamfer25_side = [part.faces().sort_by_distance(p)[0] for p in [
        (-14.451812174, 0, -8.001356027),
    ]]
    chamfer(chamfer25_edges, length=CHAMFER25_SIZE, length2=CHAMFER25_SIZE2, reference=chamfer25_side[0])

    # Chamfer26
    chamfer26_edges = [part.edges().sort_by_distance(p)[0] for p in [
        (18.389364025, 0, -25.460431837),
        (25.460431837, 0, -18.389364025),
        (31.006488008, 0, -5),
        (31.006488008, 0, 5),
        (25.460431837, 0, 18.389364025),
        (18.389364025, 0, 25.460431837),
    ]]
    chamfer26_side = [part.faces().sort_by_distance(p)[0] for p in [
        (0.962364114, 0, 2.323136756),
    ]]
    chamfer(chamfer26_edges, length=CHAMFER26_SIZE, length2=CHAMFER26_SIZE2, reference=chamfer26_side[0])

    # Chamfer39
    chamfer39_edges = [part.edges().sort_by_distance(p)[0] for p in [
        (16.629831585, 0, 6.888301783),
    ]]
    chamfer39_side = [part.faces().sort_by_distance(p)[0] for p in [
        (-2.671933538, 0, 2.671685429),
    ]]
    chamfer(chamfer39_edges, length=CHAMFER39_SIZE, length2=CHAMFER39_SIZE2, reference=chamfer39_side[0])

    # Chamfer40
    chamfer40_edges = [part.edges().sort_by_distance(p)[0] for p in [
        (16.629831585, 0, -6.888301783),
        (6.888301783, 0, -16.629831585),
        (-6.888301783, 0, -16.629831585),
        (-31.006488008, 0, -5),
        (-31.006488008, 0, 5),
        (-25.460431837, 0, 18.389364025),
        (-18.389364025, 0, 25.460431837),
        (-5, 0, 31.006488008),
        (5, 0, 31.006488008),
    ]]
    chamfer40_side = [part.faces().sort_by_distance(p)[0] for p in [
        (-2.841532186, 0, 2.638527927),
    ]]
    chamfer(chamfer40_edges, length=CHAMFER40_SIZE, length2=CHAMFER40_SIZE2, reference=chamfer40_side[0])

    # Chamfer42
    chamfer42_edges = [part.edges().sort_by_distance(p)[0] for p in [
        (-16.629831585, 0, -6.888301783),
        (-16.629831585, 0, 6.888301783),
        (-6.888301783, 0, 16.629831585),
        (6.888301783, 0, 16.629831585),
    ]]
    chamfer42_side = [part.faces().sort_by_distance(p)[0] for p in [
        (20.502942916, 0, -21.183213354),
    ]]
    chamfer(chamfer42_edges, length=CHAMFER42_SIZE, length2=CHAMFER42_SIZE2, reference=chamfer42_side[0])

    # Chamfer43
    chamfer43_edges = [part.edges().sort_by_distance(p)[0] for p in [
        (-6.888301783, 7.06, -16.629831585),
        (6.888301783, 7.06, -16.629831585),
        (16.629831585, 7.06, -6.888301783),
        (16.629831585, 7.06, 6.888301783),
        (6.888301783, 7.06, 16.629831585),
        (-6.888301783, 7.06, 16.629831585),
        (-16.629831585, 7.06, 6.888301783),
        (-16.629831585, 7.06, -6.888301783),
    ]]
    chamfer43_side = [part.faces().sort_by_distance(p)[0] for p in [
        (22.600241453, 7.06, -21.919971015),
    ]]
    chamfer(chamfer43_edges, length=CHAMFER43_SIZE, length2=CHAMFER43_SIZE2, reference=chamfer43_side[0])

    # Chamfer44
    chamfer44_edges = [part.edges().sort_by_distance(p)[0] for p in [
        (41.574578963, 0, -17.220754456),
    ]]
    chamfer44_side = [part.faces().sort_by_distance(p)[0] for p in [
        (-29.47656378, 0, 0.481023839),
    ]]
    chamfer(chamfer44_edges, length=CHAMFER44_SIZE, length2=CHAMFER44_SIZE2, reference=chamfer44_side[0])

    # Chamfer45
    chamfer45_edges = [part.edges().sort_by_distance(p)[0] for p in [
        (17.220754456, 0, -41.574578963),
        (-17.220754456, 0, -41.574578963),
        (-41.574578963, 0, -17.220754456),
        (-41.574578963, 0, 17.220754456),
        (-17.220754456, 0, 41.574578963),
        (17.220754456, 0, 41.574578963),
        (41.574578963, 0, 17.220754456),
    ]]
    chamfer45_side = [part.faces().sort_by_distance(p)[0] for p in [
        (-1.843064588, 0, 0.763087098),
    ]]
    chamfer(chamfer45_edges, length=CHAMFER45_SIZE, length2=CHAMFER45_SIZE2, reference=chamfer45_side[0])

    # Chamfer46
    chamfer46_edges = [part.edges().sort_by_distance(p)[0] for p in [
        (-41.574578963, 7.06, 17.220754456),
        (-17.220754456, 7.06, 41.574578963),
        (17.220754456, 7.06, 41.574578963),
        (41.574578963, 7.06, 17.220754456),
        (41.574578963, 7.06, -17.220754456),
        (17.220754456, 7.06, -41.574578963),
        (-17.220754456, 7.06, -41.574578963),
        (-41.574578963, 7.06, -17.220754456),
    ]]
    chamfer46_side = [part.faces().sort_by_distance(p)[0] for p in [
        (0.481023839, 7.06, -29.47656378),
    ]]
    chamfer(chamfer46_edges, length=CHAMFER46_SIZE, length2=CHAMFER46_SIZE2, reference=chamfer46_side[0])


solid = part.part
